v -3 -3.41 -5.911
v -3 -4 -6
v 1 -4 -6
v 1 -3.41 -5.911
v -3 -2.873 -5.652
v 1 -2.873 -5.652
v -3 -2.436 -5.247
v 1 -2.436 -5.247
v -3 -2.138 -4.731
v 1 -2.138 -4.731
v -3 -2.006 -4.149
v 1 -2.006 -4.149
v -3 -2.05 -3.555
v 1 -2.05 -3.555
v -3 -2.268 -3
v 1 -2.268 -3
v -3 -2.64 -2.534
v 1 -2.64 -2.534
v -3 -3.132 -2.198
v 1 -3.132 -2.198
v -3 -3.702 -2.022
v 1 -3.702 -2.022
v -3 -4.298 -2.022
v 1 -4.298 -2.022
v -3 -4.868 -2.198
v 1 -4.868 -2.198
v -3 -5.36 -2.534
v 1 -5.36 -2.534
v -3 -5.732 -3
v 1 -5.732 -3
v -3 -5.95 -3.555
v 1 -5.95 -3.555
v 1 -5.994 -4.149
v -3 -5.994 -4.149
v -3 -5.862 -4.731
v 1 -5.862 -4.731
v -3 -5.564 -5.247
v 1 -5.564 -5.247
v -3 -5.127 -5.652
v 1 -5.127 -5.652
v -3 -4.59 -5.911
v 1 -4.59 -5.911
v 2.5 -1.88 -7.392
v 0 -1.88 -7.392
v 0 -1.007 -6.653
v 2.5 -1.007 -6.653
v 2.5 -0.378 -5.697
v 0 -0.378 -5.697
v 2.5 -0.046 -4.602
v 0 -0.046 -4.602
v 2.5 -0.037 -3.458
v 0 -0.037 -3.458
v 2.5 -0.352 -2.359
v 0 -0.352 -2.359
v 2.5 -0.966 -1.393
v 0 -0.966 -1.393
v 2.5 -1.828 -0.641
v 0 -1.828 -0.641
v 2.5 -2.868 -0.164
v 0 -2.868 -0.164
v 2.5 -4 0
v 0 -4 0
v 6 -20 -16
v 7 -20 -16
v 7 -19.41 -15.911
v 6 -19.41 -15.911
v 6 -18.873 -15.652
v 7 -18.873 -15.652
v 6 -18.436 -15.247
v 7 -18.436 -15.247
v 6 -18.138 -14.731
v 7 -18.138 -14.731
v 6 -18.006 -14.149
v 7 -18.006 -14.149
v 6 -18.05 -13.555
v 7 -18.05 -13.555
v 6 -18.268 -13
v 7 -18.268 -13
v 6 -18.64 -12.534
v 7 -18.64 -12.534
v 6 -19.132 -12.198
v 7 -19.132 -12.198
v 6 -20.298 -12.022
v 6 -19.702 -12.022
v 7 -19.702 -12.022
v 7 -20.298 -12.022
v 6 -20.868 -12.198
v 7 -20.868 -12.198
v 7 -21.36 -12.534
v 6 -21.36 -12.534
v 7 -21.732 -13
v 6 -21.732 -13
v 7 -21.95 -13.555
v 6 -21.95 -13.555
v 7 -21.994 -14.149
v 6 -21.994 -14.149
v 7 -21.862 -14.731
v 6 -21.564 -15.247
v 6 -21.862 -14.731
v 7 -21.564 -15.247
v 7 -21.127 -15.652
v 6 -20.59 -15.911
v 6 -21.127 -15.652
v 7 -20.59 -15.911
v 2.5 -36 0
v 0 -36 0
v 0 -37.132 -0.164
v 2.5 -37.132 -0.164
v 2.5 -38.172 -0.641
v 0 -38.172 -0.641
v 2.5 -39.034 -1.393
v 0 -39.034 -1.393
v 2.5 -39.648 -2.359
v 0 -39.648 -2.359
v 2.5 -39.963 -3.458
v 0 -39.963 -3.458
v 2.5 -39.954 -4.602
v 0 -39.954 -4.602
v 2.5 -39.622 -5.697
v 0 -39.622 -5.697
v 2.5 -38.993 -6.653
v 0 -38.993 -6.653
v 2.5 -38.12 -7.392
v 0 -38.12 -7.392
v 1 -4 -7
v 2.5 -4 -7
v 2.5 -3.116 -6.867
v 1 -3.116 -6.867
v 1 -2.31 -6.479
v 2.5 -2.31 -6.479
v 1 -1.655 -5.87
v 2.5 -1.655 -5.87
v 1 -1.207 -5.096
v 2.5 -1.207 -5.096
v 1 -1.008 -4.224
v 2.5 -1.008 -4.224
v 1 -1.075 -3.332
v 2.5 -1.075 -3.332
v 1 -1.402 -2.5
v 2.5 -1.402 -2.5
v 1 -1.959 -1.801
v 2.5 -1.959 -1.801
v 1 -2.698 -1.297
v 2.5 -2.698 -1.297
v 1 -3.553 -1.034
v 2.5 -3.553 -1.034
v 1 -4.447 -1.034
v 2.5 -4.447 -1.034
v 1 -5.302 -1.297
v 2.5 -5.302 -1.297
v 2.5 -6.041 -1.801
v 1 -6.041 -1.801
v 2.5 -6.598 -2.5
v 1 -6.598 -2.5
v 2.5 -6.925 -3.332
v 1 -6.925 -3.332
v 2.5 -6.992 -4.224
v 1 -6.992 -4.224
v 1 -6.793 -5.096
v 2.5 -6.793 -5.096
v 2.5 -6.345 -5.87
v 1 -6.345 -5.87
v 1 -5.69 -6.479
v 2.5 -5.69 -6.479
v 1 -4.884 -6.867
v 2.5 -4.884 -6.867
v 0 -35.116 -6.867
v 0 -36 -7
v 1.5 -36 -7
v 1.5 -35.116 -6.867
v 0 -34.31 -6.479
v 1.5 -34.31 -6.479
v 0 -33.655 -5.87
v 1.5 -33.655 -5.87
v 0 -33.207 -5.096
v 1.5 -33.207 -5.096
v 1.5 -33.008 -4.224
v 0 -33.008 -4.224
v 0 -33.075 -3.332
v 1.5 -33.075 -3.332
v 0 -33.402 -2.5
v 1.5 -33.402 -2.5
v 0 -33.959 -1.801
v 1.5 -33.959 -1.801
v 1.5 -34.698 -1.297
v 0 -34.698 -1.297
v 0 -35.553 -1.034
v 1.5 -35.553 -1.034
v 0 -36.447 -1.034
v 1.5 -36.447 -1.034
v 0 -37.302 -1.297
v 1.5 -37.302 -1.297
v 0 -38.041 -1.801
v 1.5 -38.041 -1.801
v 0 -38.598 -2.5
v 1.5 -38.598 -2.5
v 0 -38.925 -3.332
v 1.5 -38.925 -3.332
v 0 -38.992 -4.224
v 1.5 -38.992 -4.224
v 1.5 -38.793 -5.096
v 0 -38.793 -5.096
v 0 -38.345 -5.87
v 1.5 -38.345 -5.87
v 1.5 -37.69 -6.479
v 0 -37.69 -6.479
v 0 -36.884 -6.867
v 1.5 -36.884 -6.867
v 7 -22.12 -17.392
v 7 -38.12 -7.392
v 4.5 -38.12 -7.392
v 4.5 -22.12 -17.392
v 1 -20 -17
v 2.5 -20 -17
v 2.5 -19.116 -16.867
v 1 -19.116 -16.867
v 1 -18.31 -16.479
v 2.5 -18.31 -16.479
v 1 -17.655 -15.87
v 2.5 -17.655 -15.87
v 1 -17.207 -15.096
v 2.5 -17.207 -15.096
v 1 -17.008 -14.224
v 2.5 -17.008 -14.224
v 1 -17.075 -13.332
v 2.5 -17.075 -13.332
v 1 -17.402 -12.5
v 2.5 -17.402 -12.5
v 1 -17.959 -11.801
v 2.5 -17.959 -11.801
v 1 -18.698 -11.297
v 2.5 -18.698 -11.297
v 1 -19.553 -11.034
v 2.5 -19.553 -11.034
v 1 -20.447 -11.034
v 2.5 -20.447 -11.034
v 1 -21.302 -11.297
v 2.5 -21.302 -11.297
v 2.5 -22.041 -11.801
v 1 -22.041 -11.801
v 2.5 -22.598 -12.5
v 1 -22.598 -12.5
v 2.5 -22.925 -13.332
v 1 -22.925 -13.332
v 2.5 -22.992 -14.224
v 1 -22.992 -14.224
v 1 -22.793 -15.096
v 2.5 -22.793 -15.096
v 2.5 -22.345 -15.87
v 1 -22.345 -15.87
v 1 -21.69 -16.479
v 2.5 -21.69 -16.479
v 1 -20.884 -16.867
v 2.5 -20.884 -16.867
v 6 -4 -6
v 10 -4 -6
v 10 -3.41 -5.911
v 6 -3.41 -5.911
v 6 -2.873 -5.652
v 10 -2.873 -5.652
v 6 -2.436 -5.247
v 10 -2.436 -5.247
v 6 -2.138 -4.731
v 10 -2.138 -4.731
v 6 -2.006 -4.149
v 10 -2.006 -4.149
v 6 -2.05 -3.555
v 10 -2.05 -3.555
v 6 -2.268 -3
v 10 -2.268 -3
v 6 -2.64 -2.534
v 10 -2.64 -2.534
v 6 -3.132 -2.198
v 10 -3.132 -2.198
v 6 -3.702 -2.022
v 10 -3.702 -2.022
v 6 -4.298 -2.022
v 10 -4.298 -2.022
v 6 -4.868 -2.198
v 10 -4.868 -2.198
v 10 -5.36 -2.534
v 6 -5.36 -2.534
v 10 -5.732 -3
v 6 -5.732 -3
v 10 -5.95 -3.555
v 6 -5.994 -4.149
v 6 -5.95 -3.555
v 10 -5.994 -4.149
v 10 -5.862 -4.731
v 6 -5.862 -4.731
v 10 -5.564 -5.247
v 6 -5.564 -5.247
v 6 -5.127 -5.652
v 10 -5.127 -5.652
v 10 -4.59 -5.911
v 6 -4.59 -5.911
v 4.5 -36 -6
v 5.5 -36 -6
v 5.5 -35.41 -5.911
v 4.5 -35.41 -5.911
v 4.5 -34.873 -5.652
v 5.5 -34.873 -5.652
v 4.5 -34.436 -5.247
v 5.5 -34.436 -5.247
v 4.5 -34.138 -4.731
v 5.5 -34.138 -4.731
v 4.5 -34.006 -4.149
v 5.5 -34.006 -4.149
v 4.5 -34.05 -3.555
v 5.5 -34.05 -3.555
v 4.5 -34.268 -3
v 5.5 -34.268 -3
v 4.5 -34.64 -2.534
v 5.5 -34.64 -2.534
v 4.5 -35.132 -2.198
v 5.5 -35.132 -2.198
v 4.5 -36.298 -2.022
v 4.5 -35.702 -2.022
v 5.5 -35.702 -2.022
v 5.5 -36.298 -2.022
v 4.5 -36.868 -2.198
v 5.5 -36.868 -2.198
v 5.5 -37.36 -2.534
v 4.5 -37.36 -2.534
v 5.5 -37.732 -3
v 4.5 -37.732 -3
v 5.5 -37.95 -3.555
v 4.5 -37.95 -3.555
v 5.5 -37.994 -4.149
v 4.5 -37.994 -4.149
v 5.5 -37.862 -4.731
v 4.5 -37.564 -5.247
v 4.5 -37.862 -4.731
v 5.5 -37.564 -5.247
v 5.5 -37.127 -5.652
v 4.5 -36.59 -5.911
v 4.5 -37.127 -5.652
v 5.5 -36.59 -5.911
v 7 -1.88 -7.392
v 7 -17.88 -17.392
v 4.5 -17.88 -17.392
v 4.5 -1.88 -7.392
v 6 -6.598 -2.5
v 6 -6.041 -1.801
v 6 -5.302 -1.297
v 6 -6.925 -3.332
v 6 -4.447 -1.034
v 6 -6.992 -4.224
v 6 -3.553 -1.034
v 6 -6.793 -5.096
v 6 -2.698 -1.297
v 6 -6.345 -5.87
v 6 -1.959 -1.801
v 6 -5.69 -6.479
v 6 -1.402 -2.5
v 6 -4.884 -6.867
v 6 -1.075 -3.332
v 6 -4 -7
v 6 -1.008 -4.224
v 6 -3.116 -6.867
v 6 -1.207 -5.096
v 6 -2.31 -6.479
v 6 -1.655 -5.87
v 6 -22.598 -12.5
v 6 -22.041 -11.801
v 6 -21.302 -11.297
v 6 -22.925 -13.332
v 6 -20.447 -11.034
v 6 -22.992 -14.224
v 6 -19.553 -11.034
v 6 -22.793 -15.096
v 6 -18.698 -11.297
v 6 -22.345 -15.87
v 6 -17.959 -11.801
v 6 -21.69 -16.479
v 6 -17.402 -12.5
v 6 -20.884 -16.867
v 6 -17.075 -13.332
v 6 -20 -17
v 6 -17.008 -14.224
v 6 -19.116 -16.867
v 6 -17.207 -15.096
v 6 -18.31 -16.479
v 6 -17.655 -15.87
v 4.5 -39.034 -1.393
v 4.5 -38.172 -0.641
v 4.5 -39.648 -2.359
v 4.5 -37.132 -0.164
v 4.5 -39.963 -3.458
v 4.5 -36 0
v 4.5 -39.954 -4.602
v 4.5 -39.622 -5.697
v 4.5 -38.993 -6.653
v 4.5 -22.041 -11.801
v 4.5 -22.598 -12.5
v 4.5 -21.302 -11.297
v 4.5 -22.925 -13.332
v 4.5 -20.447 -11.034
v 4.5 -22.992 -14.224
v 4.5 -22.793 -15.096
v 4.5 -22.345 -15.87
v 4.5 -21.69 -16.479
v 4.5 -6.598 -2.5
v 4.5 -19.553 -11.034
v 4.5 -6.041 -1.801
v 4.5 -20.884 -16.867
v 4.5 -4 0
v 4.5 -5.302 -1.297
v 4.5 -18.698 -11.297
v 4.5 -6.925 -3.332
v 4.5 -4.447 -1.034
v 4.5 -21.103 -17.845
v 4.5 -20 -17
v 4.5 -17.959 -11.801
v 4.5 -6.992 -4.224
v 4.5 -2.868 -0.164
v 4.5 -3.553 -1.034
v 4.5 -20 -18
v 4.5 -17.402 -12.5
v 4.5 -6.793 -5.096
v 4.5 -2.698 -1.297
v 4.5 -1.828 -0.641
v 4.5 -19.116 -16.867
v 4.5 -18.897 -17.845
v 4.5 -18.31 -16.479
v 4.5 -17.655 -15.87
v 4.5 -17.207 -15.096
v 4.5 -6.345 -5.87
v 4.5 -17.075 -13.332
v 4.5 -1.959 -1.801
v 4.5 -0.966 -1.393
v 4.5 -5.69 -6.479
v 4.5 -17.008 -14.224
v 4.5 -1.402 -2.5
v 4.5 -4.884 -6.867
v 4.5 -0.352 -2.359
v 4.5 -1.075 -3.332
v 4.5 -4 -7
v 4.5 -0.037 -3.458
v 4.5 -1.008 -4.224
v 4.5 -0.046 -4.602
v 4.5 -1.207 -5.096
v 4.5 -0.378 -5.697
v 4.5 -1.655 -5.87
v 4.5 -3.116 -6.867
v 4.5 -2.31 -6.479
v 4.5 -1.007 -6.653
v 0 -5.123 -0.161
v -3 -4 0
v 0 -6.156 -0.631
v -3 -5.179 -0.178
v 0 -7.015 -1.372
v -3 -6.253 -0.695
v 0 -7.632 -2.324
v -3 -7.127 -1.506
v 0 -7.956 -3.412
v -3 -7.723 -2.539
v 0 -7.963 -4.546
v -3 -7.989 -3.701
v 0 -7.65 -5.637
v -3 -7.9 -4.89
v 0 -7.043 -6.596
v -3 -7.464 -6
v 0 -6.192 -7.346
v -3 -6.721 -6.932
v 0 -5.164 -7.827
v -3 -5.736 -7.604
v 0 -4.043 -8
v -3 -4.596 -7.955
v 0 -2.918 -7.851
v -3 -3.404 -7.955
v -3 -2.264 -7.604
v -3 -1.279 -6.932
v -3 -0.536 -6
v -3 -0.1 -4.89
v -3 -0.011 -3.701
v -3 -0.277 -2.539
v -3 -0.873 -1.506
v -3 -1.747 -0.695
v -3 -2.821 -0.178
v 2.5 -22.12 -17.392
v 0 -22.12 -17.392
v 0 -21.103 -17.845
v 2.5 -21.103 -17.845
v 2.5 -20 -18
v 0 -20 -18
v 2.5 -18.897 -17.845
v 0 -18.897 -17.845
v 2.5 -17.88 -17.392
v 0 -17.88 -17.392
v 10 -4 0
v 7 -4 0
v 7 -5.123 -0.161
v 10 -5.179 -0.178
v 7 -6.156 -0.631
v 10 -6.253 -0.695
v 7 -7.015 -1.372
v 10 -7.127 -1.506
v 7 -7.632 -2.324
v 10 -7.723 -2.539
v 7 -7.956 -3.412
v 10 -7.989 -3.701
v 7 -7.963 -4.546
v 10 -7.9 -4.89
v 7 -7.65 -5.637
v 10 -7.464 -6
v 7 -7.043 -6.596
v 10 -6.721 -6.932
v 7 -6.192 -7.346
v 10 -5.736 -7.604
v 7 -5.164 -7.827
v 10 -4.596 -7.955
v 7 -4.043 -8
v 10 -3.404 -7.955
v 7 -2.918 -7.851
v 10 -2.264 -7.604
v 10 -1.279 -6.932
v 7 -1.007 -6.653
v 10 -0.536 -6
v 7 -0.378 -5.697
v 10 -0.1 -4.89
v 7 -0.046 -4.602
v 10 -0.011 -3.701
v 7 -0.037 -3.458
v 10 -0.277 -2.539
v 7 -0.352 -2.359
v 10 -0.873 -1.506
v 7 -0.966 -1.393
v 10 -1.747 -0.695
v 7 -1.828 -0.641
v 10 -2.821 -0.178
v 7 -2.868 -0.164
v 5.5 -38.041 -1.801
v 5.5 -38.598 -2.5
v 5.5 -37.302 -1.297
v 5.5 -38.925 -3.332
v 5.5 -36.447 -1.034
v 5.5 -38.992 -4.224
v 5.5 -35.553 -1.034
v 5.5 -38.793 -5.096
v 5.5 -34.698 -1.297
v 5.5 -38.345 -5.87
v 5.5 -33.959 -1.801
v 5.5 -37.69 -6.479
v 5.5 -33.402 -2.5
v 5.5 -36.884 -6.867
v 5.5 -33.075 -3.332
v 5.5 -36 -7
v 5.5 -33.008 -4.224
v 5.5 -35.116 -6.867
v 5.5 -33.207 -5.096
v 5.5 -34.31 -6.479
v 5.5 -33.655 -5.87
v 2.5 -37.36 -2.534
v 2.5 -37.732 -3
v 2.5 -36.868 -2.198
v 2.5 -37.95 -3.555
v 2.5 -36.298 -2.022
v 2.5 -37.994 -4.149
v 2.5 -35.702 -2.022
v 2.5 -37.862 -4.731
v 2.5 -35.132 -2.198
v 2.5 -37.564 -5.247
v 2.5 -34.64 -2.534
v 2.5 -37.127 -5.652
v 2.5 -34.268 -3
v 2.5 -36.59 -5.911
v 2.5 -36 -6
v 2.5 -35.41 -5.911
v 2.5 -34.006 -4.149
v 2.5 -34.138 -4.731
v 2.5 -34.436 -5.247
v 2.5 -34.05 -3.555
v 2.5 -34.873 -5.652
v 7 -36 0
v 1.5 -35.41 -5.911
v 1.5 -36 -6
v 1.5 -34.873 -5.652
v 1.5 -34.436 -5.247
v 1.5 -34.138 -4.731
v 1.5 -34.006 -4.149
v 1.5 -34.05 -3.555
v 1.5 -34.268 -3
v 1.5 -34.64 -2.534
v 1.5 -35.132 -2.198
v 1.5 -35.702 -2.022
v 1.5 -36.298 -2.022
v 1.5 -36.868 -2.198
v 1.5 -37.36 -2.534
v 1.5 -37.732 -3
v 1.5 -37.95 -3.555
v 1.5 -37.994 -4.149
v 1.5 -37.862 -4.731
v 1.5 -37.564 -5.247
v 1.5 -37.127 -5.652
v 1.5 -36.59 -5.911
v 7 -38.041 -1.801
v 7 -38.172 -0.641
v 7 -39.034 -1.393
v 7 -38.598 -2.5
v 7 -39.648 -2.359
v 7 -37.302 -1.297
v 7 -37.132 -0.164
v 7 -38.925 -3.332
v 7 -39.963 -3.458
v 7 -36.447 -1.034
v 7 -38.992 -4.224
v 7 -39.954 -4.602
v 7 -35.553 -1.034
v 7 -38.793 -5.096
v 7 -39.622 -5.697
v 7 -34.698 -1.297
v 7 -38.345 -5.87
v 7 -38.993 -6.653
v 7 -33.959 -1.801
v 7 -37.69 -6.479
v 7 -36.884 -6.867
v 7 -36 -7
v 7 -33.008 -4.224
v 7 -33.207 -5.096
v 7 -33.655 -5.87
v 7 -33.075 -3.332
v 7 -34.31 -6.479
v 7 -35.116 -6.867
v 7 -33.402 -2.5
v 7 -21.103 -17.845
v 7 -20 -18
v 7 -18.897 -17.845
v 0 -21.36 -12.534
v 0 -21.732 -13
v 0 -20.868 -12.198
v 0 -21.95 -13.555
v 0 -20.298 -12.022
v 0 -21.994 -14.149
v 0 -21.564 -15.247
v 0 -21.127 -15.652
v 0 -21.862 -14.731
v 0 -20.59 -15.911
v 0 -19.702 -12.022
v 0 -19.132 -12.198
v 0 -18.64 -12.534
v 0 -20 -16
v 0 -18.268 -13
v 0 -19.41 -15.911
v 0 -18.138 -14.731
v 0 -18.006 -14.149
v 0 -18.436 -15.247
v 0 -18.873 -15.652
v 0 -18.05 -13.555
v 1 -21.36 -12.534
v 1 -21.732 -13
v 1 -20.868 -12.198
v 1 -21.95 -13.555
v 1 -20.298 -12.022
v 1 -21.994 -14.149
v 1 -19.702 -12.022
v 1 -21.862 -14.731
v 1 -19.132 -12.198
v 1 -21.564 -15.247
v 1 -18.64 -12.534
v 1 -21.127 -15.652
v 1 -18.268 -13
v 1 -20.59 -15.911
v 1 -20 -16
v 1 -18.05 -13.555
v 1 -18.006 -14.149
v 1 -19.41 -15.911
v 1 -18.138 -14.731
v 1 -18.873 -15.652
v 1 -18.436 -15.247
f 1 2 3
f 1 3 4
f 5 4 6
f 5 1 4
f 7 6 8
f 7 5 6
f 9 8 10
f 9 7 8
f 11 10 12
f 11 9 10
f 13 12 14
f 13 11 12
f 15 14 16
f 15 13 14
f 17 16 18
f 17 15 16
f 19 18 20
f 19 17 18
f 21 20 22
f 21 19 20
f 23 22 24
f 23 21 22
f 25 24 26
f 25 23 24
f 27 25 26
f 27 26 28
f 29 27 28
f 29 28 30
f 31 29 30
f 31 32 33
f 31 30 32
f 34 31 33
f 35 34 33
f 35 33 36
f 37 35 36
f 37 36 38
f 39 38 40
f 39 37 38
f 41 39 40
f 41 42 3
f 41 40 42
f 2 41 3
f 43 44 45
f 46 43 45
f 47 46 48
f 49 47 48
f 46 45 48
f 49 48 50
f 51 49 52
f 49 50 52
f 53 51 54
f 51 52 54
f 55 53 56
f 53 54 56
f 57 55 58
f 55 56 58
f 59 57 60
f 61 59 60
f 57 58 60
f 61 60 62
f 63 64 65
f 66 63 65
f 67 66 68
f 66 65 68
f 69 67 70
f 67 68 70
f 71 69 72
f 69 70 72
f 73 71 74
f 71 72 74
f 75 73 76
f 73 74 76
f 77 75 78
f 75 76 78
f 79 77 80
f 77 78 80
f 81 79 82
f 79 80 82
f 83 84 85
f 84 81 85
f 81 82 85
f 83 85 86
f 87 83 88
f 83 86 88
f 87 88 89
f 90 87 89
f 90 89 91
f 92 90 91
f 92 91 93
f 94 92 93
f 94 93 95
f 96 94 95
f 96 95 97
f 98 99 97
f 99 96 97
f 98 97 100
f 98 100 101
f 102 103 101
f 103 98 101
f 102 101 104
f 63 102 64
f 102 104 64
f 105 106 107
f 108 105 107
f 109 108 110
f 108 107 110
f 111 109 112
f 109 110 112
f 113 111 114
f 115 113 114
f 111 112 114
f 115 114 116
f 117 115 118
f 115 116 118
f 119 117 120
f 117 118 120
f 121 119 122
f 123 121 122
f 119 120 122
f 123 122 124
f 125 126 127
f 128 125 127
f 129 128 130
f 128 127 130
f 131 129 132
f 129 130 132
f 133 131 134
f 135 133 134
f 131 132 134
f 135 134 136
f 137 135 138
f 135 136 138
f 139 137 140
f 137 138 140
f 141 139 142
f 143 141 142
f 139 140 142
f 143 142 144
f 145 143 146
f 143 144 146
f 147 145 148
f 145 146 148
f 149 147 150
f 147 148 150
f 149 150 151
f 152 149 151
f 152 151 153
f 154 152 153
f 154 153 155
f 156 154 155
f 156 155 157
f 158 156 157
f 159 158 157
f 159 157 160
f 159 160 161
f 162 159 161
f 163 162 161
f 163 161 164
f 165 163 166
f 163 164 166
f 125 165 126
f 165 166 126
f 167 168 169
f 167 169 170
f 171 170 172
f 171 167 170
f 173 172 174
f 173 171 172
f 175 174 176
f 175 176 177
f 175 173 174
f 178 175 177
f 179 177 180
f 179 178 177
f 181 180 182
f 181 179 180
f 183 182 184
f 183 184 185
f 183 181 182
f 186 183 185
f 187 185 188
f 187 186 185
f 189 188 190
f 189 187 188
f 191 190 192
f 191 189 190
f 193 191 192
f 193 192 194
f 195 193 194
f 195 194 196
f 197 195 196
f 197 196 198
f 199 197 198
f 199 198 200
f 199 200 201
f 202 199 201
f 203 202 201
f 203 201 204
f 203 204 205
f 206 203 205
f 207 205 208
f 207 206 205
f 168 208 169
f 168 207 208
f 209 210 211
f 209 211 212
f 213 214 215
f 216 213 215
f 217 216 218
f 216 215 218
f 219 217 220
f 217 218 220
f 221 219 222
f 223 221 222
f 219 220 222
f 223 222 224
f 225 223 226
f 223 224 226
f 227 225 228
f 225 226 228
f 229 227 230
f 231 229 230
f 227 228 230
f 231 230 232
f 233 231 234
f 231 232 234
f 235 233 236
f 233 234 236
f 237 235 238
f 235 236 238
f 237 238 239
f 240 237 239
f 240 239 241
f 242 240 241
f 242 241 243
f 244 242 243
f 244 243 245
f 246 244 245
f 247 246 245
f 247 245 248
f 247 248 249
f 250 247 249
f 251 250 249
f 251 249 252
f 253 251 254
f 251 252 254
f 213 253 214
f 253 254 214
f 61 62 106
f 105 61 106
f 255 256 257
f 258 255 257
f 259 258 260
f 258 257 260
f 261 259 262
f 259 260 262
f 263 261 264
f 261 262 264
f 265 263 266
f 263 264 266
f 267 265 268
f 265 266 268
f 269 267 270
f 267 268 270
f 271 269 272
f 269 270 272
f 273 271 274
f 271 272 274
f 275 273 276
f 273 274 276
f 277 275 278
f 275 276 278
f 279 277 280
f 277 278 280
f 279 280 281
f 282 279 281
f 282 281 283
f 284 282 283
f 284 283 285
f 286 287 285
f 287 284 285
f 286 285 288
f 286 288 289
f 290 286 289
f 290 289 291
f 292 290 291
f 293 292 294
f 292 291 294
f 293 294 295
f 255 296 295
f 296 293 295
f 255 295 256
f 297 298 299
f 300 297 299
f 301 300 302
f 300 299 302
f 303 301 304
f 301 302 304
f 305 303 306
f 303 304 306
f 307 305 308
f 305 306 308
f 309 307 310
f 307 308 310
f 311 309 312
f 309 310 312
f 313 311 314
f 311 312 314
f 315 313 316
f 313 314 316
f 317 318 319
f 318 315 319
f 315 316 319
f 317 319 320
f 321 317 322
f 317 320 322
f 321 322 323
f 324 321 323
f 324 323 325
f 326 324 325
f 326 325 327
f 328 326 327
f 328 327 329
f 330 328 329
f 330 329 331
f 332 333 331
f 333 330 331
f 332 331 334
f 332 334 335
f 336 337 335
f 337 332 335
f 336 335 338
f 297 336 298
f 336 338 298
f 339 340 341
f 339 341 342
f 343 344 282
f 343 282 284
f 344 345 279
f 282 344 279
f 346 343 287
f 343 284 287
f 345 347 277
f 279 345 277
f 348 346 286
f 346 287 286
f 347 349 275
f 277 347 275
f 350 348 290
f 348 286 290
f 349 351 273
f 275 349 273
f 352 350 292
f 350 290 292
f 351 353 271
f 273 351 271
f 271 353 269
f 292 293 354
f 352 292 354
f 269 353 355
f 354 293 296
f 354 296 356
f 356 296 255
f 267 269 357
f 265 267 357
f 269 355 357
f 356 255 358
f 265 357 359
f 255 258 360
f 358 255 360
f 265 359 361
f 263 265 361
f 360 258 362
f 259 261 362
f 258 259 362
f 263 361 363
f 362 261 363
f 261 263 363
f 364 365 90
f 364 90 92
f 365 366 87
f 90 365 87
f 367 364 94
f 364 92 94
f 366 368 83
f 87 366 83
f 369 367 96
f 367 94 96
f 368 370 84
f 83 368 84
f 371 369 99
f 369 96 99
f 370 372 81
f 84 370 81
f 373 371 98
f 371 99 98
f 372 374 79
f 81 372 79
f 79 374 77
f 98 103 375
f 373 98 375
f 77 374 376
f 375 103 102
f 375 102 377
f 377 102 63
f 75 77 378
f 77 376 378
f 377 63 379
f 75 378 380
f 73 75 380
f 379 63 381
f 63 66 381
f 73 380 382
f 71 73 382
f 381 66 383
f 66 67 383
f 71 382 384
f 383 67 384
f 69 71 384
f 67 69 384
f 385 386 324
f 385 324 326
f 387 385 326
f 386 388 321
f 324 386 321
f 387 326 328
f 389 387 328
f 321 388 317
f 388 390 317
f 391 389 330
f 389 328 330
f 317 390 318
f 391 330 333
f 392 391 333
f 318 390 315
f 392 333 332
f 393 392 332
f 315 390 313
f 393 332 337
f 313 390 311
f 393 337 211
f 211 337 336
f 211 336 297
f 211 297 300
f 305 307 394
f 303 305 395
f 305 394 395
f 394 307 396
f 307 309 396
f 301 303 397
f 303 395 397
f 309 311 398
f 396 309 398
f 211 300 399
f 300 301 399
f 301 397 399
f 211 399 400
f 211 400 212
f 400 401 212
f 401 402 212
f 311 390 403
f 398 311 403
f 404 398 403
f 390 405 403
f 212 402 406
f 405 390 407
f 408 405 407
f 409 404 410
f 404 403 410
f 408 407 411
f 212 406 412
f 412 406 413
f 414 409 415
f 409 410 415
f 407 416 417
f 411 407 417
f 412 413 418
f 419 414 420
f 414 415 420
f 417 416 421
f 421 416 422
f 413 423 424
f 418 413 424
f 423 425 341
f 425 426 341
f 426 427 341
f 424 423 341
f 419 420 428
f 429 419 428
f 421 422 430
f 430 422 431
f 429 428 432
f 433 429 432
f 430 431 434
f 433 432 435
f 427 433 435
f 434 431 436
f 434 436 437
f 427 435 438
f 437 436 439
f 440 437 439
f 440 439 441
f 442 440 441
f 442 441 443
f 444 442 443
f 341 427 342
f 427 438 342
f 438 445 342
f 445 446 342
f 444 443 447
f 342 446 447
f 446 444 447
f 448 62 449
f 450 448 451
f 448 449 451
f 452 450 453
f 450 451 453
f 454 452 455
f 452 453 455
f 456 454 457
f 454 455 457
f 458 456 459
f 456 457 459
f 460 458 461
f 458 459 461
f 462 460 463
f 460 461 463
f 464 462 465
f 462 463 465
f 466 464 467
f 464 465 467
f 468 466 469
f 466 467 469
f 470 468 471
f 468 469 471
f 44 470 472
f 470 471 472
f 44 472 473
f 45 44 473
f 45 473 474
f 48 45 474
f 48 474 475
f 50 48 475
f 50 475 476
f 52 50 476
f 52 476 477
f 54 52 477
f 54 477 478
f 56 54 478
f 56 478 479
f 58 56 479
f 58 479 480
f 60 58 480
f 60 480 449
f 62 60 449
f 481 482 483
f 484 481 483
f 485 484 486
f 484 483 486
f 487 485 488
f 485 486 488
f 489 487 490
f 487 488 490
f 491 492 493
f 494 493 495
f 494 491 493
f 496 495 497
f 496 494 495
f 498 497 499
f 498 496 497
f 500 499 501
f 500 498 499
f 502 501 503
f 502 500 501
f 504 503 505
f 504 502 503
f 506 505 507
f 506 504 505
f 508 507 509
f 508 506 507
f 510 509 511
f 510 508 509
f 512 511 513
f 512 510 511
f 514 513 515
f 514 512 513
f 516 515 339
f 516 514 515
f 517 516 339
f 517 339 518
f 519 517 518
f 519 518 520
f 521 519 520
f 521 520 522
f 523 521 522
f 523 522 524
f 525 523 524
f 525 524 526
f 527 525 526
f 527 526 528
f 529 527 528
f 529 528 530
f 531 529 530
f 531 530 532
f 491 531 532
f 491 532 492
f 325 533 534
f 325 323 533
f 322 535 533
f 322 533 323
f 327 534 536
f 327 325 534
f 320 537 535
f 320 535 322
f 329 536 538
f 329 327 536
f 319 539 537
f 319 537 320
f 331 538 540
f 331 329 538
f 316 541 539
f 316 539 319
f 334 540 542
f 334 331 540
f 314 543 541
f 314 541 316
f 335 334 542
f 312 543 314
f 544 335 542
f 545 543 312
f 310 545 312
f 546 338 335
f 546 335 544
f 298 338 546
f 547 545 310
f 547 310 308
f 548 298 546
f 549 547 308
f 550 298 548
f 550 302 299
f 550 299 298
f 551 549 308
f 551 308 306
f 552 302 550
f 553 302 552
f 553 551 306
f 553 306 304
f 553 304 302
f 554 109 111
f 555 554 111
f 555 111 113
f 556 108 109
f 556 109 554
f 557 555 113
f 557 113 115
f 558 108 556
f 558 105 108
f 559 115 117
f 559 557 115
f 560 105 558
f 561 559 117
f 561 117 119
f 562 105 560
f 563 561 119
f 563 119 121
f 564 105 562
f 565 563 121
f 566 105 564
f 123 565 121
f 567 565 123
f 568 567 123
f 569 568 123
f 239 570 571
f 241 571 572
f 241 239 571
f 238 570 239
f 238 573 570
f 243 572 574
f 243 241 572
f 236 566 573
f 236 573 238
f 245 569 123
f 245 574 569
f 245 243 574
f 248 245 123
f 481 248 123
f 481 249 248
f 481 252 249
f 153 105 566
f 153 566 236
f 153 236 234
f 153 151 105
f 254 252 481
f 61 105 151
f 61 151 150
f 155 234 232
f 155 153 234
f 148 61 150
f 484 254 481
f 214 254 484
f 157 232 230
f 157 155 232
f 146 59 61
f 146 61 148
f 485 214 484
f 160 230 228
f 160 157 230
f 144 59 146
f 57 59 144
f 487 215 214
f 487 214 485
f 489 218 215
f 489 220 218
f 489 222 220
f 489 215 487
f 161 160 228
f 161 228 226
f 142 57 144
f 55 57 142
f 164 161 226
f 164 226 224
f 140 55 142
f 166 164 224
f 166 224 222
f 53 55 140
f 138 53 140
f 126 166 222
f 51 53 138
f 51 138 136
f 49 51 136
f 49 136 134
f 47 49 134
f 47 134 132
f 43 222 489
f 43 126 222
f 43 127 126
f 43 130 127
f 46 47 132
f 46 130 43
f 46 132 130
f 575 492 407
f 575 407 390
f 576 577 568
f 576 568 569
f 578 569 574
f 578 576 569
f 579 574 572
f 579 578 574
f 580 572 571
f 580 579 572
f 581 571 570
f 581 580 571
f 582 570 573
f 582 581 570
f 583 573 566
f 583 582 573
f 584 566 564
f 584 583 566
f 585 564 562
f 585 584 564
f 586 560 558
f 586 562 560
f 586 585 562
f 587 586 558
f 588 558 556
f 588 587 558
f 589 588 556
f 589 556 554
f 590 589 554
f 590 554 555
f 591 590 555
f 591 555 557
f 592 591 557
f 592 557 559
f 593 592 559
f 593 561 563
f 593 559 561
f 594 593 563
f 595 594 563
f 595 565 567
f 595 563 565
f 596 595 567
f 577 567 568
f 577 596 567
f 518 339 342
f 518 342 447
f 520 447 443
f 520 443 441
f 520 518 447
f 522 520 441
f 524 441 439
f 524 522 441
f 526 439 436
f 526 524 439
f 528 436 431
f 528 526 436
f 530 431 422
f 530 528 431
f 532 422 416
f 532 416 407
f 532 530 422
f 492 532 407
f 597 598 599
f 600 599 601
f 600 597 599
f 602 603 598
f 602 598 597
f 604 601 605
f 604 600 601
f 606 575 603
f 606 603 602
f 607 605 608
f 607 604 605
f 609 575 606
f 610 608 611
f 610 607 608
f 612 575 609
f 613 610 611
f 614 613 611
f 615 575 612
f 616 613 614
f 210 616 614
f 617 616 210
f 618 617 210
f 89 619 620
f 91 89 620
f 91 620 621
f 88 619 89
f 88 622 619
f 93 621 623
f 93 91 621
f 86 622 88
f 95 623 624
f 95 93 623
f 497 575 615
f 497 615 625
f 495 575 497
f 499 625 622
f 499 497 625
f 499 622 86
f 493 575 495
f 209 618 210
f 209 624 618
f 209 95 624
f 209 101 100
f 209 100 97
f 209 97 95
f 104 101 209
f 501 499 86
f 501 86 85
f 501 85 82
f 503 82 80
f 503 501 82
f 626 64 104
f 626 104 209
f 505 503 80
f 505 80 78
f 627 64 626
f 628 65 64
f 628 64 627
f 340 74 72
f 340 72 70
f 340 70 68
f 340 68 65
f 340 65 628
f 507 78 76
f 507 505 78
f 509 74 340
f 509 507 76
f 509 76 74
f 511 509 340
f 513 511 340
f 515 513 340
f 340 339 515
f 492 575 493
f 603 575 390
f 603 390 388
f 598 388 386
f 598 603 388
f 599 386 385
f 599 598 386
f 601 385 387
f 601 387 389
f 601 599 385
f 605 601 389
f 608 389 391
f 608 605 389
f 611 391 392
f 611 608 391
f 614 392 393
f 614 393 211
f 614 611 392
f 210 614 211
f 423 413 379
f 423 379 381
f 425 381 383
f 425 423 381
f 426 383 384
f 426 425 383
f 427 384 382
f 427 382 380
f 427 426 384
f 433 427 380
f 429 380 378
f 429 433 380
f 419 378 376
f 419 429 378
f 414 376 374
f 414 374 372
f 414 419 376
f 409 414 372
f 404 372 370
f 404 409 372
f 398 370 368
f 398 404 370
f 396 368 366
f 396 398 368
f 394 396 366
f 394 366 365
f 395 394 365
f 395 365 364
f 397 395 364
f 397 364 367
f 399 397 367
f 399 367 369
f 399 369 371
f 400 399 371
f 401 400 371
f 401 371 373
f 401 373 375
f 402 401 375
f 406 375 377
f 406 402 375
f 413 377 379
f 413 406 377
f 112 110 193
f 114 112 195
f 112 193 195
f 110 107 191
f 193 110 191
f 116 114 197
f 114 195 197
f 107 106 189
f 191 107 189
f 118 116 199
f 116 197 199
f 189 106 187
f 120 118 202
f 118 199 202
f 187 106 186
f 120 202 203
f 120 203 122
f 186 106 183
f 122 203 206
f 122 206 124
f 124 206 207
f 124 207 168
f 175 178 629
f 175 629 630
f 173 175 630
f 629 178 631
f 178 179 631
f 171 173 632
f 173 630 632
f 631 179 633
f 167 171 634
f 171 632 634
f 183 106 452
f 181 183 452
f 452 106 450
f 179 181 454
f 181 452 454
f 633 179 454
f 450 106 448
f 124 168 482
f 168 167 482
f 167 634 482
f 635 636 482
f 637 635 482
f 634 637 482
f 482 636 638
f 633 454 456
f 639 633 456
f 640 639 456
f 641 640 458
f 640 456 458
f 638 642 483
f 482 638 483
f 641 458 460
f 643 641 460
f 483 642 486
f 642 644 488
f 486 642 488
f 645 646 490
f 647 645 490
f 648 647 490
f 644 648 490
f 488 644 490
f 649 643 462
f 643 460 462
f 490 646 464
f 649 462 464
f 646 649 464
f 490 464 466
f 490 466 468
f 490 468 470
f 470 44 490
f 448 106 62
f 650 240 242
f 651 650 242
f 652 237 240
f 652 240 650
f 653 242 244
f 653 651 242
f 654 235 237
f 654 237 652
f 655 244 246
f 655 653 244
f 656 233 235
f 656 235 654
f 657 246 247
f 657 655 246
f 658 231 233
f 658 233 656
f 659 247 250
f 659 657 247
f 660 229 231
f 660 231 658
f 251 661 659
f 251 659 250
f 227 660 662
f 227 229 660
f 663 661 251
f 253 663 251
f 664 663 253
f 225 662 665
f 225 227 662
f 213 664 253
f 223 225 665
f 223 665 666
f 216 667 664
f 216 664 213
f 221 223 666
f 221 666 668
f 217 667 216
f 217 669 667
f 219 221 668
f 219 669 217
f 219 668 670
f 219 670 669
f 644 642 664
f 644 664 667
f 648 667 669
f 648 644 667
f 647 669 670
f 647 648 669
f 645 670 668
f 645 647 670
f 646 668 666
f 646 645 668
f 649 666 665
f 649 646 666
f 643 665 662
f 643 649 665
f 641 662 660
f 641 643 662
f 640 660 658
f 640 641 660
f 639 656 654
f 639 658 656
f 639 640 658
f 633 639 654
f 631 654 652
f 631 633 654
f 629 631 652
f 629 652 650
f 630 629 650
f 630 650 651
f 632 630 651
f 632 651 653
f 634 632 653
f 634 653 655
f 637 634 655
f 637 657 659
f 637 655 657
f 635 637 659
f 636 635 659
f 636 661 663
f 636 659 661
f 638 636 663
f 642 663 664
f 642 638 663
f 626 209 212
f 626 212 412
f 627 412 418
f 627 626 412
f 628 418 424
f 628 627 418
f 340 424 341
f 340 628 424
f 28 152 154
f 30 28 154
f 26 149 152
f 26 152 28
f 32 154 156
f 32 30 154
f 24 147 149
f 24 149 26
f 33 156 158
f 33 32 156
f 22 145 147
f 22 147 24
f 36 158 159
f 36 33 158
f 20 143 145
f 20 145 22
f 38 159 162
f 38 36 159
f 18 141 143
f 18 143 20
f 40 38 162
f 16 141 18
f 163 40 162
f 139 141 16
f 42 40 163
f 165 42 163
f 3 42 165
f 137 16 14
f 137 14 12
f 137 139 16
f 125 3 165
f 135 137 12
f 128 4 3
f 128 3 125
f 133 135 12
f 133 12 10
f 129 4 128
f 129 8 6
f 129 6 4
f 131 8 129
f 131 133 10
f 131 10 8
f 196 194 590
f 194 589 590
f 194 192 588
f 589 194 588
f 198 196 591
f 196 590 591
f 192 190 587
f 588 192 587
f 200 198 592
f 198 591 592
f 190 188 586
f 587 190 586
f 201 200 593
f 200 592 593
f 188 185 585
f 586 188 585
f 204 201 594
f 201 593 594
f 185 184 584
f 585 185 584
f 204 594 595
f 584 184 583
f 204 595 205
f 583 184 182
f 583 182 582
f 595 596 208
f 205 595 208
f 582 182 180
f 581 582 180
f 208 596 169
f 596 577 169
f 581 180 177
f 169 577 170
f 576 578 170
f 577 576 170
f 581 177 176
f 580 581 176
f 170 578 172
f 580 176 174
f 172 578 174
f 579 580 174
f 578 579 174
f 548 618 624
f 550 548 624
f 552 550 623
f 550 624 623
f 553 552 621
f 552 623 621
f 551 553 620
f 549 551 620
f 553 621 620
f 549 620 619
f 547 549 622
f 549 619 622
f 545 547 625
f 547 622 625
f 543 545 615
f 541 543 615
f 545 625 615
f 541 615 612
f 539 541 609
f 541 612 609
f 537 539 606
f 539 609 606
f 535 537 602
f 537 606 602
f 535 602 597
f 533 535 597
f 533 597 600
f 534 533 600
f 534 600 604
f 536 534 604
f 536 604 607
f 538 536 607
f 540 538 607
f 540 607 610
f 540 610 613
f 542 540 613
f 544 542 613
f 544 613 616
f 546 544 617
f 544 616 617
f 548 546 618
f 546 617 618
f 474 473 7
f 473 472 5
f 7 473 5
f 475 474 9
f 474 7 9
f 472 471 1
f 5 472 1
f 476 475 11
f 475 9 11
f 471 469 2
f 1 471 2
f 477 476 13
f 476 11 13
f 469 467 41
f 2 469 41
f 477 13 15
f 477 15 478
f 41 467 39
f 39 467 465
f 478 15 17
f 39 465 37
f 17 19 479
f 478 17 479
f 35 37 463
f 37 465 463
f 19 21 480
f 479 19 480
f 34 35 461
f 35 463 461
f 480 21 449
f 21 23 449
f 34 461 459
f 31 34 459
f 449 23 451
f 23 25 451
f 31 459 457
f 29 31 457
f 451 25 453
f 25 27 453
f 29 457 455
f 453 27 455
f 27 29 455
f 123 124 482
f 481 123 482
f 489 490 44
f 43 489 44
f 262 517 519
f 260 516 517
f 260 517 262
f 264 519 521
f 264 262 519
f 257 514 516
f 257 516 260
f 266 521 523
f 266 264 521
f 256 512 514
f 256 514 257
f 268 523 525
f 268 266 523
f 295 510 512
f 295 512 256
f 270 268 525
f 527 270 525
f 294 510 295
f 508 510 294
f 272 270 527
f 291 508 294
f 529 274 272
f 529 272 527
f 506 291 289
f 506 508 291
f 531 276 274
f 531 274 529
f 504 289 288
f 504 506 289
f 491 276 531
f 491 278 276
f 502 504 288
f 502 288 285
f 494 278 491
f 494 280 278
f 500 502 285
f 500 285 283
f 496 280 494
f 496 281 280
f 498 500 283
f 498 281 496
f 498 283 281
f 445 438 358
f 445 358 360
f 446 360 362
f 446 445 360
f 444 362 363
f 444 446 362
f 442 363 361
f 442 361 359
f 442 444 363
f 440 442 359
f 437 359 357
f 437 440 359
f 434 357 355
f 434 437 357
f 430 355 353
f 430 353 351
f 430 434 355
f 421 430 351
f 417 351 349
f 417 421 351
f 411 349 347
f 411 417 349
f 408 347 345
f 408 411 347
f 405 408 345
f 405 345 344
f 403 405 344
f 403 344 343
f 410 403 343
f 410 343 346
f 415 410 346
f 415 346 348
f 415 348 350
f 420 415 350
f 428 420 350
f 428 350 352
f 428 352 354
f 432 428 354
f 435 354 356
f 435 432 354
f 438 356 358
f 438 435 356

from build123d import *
from build123d.topology import SkipClean

# Parameters (mm, degrees)
EXTRUDE_1_DEPTH          = 2.5
EXTRUDE_START            = -3
SKETCH_1_4_R             = 4
EXTRUDE_2_DEPTH          = 3
CUT_EXTRUDE_1_DEPTH      = 44.965895874
CUT_EXTRUDE_1_DEPTH_BACK = 44.965895874
SKETCH_1_3_R             = 2
SKETCH_2_R               = 3
CUT_EXTRUDE_2_DEPTH      = 1.5
CUT_EXTRUDE_START        = -2.5
SKETCH_2_3_R             = 3
CUT_EXTRUDE_3_DEPTH      = 1.5


with BuildPart() as part:
    # 草图1 → 凸台-拉伸1 (new body)
    with BuildSketch(Plane(origin=(0, 0, 0), x_dir=(0, 0, -1), z_dir=(1, 0, 0))):
        with BuildLine():
            Line((17.391993216, -17.88000424), (7.391993216, -1.88000424))
            ThreePointArc((7.391993216, -1.88000424), (2.897269948, -0.155005015), (0, -4))
            Line((0, -4), (0, -36))
            ThreePointArc((0, -36), (2.897269948, -39.844994985), (7.391993216, -38.11999576))
            Line((7.391993216, -38.11999576), (17.391993216, -22.11999576))
            ThreePointArc((17.391993216, -22.11999576), (18, -20), (17.391993216, -17.88000424))
        make_face()
    extrude(amount=EXTRUDE_1_DEPTH)

    # 草图1<4> → 凸台-拉伸2 (add)
    with SkipClean():  # the faces are left unmerged after this step: merging them gives an invalid solid
        with BuildSketch(Plane(origin=(0, 0, 0), x_dir=(0, 0, -1), z_dir=(1, 0, 0)).offset(EXTRUDE_START)):
            with Locations(Location((4, -4, 0), (0, 0, 180))):
                Circle(SKETCH_1_4_R)
        extrude(amount=EXTRUDE_2_DEPTH)

    # 草图1<3> → 切除-拉伸1 (cut, two sides: drawn at the far end of the back side and taken through both)
    with SkipClean():  # the faces are left unmerged after this step: merging them gives an invalid solid
        with BuildSketch(Plane(origin=(0, 0, 0), x_dir=(0, 0, -1), z_dir=(1, 0, 0)).offset(-CUT_EXTRUDE_1_DEPTH_BACK)):
            with Locations((4, -4)):
                Circle(SKETCH_1_3_R)
            with Locations((14, -20)):
                Circle(SKETCH_1_3_R)
            with Locations((4, -36)):
                Circle(SKETCH_1_3_R)
        extrude(amount=CUT_EXTRUDE_1_DEPTH + CUT_EXTRUDE_1_DEPTH_BACK, mode=Mode.SUBTRACT)

    # 草图2 → 切除-拉伸2 (cut)
    with SkipClean():  # the faces are left unmerged after this step: merging them gives an invalid solid
        with BuildSketch(Plane(origin=(2.5, 0, 0), x_dir=(0, 0, -1), z_dir=(1, 0, 0))):
            with Locations((4, -4)):
                Circle(SKETCH_2_R)
            with Locations((14, -20)):
                Circle(SKETCH_2_R)
        extrude(amount=-CUT_EXTRUDE_2_DEPTH, mode=Mode.SUBTRACT)

    # 草图2<3> → 切除-拉伸3 (cut)
    with SkipClean():  # the faces are left unmerged after this step: merging them gives an invalid solid
        with BuildSketch(Plane(origin=(2.5, 0, 0), x_dir=(0, 0, -1), z_dir=(1, 0, 0)).offset(CUT_EXTRUDE_START)):
            with Locations((4, -36)):
                Circle(SKETCH_2_3_R)
        extrude(amount=CUT_EXTRUDE_3_DEPTH, mode=Mode.SUBTRACT)


with BuildPart() as body_2:
    # 镜向2: mirrored copy
    add(part.part.mirror(Plane(origin=(3.5, 0, 0), x_dir=(0, 0, 1), z_dir=(1, 0, 0))))


solid = Compound([part.part, body_2.part])
